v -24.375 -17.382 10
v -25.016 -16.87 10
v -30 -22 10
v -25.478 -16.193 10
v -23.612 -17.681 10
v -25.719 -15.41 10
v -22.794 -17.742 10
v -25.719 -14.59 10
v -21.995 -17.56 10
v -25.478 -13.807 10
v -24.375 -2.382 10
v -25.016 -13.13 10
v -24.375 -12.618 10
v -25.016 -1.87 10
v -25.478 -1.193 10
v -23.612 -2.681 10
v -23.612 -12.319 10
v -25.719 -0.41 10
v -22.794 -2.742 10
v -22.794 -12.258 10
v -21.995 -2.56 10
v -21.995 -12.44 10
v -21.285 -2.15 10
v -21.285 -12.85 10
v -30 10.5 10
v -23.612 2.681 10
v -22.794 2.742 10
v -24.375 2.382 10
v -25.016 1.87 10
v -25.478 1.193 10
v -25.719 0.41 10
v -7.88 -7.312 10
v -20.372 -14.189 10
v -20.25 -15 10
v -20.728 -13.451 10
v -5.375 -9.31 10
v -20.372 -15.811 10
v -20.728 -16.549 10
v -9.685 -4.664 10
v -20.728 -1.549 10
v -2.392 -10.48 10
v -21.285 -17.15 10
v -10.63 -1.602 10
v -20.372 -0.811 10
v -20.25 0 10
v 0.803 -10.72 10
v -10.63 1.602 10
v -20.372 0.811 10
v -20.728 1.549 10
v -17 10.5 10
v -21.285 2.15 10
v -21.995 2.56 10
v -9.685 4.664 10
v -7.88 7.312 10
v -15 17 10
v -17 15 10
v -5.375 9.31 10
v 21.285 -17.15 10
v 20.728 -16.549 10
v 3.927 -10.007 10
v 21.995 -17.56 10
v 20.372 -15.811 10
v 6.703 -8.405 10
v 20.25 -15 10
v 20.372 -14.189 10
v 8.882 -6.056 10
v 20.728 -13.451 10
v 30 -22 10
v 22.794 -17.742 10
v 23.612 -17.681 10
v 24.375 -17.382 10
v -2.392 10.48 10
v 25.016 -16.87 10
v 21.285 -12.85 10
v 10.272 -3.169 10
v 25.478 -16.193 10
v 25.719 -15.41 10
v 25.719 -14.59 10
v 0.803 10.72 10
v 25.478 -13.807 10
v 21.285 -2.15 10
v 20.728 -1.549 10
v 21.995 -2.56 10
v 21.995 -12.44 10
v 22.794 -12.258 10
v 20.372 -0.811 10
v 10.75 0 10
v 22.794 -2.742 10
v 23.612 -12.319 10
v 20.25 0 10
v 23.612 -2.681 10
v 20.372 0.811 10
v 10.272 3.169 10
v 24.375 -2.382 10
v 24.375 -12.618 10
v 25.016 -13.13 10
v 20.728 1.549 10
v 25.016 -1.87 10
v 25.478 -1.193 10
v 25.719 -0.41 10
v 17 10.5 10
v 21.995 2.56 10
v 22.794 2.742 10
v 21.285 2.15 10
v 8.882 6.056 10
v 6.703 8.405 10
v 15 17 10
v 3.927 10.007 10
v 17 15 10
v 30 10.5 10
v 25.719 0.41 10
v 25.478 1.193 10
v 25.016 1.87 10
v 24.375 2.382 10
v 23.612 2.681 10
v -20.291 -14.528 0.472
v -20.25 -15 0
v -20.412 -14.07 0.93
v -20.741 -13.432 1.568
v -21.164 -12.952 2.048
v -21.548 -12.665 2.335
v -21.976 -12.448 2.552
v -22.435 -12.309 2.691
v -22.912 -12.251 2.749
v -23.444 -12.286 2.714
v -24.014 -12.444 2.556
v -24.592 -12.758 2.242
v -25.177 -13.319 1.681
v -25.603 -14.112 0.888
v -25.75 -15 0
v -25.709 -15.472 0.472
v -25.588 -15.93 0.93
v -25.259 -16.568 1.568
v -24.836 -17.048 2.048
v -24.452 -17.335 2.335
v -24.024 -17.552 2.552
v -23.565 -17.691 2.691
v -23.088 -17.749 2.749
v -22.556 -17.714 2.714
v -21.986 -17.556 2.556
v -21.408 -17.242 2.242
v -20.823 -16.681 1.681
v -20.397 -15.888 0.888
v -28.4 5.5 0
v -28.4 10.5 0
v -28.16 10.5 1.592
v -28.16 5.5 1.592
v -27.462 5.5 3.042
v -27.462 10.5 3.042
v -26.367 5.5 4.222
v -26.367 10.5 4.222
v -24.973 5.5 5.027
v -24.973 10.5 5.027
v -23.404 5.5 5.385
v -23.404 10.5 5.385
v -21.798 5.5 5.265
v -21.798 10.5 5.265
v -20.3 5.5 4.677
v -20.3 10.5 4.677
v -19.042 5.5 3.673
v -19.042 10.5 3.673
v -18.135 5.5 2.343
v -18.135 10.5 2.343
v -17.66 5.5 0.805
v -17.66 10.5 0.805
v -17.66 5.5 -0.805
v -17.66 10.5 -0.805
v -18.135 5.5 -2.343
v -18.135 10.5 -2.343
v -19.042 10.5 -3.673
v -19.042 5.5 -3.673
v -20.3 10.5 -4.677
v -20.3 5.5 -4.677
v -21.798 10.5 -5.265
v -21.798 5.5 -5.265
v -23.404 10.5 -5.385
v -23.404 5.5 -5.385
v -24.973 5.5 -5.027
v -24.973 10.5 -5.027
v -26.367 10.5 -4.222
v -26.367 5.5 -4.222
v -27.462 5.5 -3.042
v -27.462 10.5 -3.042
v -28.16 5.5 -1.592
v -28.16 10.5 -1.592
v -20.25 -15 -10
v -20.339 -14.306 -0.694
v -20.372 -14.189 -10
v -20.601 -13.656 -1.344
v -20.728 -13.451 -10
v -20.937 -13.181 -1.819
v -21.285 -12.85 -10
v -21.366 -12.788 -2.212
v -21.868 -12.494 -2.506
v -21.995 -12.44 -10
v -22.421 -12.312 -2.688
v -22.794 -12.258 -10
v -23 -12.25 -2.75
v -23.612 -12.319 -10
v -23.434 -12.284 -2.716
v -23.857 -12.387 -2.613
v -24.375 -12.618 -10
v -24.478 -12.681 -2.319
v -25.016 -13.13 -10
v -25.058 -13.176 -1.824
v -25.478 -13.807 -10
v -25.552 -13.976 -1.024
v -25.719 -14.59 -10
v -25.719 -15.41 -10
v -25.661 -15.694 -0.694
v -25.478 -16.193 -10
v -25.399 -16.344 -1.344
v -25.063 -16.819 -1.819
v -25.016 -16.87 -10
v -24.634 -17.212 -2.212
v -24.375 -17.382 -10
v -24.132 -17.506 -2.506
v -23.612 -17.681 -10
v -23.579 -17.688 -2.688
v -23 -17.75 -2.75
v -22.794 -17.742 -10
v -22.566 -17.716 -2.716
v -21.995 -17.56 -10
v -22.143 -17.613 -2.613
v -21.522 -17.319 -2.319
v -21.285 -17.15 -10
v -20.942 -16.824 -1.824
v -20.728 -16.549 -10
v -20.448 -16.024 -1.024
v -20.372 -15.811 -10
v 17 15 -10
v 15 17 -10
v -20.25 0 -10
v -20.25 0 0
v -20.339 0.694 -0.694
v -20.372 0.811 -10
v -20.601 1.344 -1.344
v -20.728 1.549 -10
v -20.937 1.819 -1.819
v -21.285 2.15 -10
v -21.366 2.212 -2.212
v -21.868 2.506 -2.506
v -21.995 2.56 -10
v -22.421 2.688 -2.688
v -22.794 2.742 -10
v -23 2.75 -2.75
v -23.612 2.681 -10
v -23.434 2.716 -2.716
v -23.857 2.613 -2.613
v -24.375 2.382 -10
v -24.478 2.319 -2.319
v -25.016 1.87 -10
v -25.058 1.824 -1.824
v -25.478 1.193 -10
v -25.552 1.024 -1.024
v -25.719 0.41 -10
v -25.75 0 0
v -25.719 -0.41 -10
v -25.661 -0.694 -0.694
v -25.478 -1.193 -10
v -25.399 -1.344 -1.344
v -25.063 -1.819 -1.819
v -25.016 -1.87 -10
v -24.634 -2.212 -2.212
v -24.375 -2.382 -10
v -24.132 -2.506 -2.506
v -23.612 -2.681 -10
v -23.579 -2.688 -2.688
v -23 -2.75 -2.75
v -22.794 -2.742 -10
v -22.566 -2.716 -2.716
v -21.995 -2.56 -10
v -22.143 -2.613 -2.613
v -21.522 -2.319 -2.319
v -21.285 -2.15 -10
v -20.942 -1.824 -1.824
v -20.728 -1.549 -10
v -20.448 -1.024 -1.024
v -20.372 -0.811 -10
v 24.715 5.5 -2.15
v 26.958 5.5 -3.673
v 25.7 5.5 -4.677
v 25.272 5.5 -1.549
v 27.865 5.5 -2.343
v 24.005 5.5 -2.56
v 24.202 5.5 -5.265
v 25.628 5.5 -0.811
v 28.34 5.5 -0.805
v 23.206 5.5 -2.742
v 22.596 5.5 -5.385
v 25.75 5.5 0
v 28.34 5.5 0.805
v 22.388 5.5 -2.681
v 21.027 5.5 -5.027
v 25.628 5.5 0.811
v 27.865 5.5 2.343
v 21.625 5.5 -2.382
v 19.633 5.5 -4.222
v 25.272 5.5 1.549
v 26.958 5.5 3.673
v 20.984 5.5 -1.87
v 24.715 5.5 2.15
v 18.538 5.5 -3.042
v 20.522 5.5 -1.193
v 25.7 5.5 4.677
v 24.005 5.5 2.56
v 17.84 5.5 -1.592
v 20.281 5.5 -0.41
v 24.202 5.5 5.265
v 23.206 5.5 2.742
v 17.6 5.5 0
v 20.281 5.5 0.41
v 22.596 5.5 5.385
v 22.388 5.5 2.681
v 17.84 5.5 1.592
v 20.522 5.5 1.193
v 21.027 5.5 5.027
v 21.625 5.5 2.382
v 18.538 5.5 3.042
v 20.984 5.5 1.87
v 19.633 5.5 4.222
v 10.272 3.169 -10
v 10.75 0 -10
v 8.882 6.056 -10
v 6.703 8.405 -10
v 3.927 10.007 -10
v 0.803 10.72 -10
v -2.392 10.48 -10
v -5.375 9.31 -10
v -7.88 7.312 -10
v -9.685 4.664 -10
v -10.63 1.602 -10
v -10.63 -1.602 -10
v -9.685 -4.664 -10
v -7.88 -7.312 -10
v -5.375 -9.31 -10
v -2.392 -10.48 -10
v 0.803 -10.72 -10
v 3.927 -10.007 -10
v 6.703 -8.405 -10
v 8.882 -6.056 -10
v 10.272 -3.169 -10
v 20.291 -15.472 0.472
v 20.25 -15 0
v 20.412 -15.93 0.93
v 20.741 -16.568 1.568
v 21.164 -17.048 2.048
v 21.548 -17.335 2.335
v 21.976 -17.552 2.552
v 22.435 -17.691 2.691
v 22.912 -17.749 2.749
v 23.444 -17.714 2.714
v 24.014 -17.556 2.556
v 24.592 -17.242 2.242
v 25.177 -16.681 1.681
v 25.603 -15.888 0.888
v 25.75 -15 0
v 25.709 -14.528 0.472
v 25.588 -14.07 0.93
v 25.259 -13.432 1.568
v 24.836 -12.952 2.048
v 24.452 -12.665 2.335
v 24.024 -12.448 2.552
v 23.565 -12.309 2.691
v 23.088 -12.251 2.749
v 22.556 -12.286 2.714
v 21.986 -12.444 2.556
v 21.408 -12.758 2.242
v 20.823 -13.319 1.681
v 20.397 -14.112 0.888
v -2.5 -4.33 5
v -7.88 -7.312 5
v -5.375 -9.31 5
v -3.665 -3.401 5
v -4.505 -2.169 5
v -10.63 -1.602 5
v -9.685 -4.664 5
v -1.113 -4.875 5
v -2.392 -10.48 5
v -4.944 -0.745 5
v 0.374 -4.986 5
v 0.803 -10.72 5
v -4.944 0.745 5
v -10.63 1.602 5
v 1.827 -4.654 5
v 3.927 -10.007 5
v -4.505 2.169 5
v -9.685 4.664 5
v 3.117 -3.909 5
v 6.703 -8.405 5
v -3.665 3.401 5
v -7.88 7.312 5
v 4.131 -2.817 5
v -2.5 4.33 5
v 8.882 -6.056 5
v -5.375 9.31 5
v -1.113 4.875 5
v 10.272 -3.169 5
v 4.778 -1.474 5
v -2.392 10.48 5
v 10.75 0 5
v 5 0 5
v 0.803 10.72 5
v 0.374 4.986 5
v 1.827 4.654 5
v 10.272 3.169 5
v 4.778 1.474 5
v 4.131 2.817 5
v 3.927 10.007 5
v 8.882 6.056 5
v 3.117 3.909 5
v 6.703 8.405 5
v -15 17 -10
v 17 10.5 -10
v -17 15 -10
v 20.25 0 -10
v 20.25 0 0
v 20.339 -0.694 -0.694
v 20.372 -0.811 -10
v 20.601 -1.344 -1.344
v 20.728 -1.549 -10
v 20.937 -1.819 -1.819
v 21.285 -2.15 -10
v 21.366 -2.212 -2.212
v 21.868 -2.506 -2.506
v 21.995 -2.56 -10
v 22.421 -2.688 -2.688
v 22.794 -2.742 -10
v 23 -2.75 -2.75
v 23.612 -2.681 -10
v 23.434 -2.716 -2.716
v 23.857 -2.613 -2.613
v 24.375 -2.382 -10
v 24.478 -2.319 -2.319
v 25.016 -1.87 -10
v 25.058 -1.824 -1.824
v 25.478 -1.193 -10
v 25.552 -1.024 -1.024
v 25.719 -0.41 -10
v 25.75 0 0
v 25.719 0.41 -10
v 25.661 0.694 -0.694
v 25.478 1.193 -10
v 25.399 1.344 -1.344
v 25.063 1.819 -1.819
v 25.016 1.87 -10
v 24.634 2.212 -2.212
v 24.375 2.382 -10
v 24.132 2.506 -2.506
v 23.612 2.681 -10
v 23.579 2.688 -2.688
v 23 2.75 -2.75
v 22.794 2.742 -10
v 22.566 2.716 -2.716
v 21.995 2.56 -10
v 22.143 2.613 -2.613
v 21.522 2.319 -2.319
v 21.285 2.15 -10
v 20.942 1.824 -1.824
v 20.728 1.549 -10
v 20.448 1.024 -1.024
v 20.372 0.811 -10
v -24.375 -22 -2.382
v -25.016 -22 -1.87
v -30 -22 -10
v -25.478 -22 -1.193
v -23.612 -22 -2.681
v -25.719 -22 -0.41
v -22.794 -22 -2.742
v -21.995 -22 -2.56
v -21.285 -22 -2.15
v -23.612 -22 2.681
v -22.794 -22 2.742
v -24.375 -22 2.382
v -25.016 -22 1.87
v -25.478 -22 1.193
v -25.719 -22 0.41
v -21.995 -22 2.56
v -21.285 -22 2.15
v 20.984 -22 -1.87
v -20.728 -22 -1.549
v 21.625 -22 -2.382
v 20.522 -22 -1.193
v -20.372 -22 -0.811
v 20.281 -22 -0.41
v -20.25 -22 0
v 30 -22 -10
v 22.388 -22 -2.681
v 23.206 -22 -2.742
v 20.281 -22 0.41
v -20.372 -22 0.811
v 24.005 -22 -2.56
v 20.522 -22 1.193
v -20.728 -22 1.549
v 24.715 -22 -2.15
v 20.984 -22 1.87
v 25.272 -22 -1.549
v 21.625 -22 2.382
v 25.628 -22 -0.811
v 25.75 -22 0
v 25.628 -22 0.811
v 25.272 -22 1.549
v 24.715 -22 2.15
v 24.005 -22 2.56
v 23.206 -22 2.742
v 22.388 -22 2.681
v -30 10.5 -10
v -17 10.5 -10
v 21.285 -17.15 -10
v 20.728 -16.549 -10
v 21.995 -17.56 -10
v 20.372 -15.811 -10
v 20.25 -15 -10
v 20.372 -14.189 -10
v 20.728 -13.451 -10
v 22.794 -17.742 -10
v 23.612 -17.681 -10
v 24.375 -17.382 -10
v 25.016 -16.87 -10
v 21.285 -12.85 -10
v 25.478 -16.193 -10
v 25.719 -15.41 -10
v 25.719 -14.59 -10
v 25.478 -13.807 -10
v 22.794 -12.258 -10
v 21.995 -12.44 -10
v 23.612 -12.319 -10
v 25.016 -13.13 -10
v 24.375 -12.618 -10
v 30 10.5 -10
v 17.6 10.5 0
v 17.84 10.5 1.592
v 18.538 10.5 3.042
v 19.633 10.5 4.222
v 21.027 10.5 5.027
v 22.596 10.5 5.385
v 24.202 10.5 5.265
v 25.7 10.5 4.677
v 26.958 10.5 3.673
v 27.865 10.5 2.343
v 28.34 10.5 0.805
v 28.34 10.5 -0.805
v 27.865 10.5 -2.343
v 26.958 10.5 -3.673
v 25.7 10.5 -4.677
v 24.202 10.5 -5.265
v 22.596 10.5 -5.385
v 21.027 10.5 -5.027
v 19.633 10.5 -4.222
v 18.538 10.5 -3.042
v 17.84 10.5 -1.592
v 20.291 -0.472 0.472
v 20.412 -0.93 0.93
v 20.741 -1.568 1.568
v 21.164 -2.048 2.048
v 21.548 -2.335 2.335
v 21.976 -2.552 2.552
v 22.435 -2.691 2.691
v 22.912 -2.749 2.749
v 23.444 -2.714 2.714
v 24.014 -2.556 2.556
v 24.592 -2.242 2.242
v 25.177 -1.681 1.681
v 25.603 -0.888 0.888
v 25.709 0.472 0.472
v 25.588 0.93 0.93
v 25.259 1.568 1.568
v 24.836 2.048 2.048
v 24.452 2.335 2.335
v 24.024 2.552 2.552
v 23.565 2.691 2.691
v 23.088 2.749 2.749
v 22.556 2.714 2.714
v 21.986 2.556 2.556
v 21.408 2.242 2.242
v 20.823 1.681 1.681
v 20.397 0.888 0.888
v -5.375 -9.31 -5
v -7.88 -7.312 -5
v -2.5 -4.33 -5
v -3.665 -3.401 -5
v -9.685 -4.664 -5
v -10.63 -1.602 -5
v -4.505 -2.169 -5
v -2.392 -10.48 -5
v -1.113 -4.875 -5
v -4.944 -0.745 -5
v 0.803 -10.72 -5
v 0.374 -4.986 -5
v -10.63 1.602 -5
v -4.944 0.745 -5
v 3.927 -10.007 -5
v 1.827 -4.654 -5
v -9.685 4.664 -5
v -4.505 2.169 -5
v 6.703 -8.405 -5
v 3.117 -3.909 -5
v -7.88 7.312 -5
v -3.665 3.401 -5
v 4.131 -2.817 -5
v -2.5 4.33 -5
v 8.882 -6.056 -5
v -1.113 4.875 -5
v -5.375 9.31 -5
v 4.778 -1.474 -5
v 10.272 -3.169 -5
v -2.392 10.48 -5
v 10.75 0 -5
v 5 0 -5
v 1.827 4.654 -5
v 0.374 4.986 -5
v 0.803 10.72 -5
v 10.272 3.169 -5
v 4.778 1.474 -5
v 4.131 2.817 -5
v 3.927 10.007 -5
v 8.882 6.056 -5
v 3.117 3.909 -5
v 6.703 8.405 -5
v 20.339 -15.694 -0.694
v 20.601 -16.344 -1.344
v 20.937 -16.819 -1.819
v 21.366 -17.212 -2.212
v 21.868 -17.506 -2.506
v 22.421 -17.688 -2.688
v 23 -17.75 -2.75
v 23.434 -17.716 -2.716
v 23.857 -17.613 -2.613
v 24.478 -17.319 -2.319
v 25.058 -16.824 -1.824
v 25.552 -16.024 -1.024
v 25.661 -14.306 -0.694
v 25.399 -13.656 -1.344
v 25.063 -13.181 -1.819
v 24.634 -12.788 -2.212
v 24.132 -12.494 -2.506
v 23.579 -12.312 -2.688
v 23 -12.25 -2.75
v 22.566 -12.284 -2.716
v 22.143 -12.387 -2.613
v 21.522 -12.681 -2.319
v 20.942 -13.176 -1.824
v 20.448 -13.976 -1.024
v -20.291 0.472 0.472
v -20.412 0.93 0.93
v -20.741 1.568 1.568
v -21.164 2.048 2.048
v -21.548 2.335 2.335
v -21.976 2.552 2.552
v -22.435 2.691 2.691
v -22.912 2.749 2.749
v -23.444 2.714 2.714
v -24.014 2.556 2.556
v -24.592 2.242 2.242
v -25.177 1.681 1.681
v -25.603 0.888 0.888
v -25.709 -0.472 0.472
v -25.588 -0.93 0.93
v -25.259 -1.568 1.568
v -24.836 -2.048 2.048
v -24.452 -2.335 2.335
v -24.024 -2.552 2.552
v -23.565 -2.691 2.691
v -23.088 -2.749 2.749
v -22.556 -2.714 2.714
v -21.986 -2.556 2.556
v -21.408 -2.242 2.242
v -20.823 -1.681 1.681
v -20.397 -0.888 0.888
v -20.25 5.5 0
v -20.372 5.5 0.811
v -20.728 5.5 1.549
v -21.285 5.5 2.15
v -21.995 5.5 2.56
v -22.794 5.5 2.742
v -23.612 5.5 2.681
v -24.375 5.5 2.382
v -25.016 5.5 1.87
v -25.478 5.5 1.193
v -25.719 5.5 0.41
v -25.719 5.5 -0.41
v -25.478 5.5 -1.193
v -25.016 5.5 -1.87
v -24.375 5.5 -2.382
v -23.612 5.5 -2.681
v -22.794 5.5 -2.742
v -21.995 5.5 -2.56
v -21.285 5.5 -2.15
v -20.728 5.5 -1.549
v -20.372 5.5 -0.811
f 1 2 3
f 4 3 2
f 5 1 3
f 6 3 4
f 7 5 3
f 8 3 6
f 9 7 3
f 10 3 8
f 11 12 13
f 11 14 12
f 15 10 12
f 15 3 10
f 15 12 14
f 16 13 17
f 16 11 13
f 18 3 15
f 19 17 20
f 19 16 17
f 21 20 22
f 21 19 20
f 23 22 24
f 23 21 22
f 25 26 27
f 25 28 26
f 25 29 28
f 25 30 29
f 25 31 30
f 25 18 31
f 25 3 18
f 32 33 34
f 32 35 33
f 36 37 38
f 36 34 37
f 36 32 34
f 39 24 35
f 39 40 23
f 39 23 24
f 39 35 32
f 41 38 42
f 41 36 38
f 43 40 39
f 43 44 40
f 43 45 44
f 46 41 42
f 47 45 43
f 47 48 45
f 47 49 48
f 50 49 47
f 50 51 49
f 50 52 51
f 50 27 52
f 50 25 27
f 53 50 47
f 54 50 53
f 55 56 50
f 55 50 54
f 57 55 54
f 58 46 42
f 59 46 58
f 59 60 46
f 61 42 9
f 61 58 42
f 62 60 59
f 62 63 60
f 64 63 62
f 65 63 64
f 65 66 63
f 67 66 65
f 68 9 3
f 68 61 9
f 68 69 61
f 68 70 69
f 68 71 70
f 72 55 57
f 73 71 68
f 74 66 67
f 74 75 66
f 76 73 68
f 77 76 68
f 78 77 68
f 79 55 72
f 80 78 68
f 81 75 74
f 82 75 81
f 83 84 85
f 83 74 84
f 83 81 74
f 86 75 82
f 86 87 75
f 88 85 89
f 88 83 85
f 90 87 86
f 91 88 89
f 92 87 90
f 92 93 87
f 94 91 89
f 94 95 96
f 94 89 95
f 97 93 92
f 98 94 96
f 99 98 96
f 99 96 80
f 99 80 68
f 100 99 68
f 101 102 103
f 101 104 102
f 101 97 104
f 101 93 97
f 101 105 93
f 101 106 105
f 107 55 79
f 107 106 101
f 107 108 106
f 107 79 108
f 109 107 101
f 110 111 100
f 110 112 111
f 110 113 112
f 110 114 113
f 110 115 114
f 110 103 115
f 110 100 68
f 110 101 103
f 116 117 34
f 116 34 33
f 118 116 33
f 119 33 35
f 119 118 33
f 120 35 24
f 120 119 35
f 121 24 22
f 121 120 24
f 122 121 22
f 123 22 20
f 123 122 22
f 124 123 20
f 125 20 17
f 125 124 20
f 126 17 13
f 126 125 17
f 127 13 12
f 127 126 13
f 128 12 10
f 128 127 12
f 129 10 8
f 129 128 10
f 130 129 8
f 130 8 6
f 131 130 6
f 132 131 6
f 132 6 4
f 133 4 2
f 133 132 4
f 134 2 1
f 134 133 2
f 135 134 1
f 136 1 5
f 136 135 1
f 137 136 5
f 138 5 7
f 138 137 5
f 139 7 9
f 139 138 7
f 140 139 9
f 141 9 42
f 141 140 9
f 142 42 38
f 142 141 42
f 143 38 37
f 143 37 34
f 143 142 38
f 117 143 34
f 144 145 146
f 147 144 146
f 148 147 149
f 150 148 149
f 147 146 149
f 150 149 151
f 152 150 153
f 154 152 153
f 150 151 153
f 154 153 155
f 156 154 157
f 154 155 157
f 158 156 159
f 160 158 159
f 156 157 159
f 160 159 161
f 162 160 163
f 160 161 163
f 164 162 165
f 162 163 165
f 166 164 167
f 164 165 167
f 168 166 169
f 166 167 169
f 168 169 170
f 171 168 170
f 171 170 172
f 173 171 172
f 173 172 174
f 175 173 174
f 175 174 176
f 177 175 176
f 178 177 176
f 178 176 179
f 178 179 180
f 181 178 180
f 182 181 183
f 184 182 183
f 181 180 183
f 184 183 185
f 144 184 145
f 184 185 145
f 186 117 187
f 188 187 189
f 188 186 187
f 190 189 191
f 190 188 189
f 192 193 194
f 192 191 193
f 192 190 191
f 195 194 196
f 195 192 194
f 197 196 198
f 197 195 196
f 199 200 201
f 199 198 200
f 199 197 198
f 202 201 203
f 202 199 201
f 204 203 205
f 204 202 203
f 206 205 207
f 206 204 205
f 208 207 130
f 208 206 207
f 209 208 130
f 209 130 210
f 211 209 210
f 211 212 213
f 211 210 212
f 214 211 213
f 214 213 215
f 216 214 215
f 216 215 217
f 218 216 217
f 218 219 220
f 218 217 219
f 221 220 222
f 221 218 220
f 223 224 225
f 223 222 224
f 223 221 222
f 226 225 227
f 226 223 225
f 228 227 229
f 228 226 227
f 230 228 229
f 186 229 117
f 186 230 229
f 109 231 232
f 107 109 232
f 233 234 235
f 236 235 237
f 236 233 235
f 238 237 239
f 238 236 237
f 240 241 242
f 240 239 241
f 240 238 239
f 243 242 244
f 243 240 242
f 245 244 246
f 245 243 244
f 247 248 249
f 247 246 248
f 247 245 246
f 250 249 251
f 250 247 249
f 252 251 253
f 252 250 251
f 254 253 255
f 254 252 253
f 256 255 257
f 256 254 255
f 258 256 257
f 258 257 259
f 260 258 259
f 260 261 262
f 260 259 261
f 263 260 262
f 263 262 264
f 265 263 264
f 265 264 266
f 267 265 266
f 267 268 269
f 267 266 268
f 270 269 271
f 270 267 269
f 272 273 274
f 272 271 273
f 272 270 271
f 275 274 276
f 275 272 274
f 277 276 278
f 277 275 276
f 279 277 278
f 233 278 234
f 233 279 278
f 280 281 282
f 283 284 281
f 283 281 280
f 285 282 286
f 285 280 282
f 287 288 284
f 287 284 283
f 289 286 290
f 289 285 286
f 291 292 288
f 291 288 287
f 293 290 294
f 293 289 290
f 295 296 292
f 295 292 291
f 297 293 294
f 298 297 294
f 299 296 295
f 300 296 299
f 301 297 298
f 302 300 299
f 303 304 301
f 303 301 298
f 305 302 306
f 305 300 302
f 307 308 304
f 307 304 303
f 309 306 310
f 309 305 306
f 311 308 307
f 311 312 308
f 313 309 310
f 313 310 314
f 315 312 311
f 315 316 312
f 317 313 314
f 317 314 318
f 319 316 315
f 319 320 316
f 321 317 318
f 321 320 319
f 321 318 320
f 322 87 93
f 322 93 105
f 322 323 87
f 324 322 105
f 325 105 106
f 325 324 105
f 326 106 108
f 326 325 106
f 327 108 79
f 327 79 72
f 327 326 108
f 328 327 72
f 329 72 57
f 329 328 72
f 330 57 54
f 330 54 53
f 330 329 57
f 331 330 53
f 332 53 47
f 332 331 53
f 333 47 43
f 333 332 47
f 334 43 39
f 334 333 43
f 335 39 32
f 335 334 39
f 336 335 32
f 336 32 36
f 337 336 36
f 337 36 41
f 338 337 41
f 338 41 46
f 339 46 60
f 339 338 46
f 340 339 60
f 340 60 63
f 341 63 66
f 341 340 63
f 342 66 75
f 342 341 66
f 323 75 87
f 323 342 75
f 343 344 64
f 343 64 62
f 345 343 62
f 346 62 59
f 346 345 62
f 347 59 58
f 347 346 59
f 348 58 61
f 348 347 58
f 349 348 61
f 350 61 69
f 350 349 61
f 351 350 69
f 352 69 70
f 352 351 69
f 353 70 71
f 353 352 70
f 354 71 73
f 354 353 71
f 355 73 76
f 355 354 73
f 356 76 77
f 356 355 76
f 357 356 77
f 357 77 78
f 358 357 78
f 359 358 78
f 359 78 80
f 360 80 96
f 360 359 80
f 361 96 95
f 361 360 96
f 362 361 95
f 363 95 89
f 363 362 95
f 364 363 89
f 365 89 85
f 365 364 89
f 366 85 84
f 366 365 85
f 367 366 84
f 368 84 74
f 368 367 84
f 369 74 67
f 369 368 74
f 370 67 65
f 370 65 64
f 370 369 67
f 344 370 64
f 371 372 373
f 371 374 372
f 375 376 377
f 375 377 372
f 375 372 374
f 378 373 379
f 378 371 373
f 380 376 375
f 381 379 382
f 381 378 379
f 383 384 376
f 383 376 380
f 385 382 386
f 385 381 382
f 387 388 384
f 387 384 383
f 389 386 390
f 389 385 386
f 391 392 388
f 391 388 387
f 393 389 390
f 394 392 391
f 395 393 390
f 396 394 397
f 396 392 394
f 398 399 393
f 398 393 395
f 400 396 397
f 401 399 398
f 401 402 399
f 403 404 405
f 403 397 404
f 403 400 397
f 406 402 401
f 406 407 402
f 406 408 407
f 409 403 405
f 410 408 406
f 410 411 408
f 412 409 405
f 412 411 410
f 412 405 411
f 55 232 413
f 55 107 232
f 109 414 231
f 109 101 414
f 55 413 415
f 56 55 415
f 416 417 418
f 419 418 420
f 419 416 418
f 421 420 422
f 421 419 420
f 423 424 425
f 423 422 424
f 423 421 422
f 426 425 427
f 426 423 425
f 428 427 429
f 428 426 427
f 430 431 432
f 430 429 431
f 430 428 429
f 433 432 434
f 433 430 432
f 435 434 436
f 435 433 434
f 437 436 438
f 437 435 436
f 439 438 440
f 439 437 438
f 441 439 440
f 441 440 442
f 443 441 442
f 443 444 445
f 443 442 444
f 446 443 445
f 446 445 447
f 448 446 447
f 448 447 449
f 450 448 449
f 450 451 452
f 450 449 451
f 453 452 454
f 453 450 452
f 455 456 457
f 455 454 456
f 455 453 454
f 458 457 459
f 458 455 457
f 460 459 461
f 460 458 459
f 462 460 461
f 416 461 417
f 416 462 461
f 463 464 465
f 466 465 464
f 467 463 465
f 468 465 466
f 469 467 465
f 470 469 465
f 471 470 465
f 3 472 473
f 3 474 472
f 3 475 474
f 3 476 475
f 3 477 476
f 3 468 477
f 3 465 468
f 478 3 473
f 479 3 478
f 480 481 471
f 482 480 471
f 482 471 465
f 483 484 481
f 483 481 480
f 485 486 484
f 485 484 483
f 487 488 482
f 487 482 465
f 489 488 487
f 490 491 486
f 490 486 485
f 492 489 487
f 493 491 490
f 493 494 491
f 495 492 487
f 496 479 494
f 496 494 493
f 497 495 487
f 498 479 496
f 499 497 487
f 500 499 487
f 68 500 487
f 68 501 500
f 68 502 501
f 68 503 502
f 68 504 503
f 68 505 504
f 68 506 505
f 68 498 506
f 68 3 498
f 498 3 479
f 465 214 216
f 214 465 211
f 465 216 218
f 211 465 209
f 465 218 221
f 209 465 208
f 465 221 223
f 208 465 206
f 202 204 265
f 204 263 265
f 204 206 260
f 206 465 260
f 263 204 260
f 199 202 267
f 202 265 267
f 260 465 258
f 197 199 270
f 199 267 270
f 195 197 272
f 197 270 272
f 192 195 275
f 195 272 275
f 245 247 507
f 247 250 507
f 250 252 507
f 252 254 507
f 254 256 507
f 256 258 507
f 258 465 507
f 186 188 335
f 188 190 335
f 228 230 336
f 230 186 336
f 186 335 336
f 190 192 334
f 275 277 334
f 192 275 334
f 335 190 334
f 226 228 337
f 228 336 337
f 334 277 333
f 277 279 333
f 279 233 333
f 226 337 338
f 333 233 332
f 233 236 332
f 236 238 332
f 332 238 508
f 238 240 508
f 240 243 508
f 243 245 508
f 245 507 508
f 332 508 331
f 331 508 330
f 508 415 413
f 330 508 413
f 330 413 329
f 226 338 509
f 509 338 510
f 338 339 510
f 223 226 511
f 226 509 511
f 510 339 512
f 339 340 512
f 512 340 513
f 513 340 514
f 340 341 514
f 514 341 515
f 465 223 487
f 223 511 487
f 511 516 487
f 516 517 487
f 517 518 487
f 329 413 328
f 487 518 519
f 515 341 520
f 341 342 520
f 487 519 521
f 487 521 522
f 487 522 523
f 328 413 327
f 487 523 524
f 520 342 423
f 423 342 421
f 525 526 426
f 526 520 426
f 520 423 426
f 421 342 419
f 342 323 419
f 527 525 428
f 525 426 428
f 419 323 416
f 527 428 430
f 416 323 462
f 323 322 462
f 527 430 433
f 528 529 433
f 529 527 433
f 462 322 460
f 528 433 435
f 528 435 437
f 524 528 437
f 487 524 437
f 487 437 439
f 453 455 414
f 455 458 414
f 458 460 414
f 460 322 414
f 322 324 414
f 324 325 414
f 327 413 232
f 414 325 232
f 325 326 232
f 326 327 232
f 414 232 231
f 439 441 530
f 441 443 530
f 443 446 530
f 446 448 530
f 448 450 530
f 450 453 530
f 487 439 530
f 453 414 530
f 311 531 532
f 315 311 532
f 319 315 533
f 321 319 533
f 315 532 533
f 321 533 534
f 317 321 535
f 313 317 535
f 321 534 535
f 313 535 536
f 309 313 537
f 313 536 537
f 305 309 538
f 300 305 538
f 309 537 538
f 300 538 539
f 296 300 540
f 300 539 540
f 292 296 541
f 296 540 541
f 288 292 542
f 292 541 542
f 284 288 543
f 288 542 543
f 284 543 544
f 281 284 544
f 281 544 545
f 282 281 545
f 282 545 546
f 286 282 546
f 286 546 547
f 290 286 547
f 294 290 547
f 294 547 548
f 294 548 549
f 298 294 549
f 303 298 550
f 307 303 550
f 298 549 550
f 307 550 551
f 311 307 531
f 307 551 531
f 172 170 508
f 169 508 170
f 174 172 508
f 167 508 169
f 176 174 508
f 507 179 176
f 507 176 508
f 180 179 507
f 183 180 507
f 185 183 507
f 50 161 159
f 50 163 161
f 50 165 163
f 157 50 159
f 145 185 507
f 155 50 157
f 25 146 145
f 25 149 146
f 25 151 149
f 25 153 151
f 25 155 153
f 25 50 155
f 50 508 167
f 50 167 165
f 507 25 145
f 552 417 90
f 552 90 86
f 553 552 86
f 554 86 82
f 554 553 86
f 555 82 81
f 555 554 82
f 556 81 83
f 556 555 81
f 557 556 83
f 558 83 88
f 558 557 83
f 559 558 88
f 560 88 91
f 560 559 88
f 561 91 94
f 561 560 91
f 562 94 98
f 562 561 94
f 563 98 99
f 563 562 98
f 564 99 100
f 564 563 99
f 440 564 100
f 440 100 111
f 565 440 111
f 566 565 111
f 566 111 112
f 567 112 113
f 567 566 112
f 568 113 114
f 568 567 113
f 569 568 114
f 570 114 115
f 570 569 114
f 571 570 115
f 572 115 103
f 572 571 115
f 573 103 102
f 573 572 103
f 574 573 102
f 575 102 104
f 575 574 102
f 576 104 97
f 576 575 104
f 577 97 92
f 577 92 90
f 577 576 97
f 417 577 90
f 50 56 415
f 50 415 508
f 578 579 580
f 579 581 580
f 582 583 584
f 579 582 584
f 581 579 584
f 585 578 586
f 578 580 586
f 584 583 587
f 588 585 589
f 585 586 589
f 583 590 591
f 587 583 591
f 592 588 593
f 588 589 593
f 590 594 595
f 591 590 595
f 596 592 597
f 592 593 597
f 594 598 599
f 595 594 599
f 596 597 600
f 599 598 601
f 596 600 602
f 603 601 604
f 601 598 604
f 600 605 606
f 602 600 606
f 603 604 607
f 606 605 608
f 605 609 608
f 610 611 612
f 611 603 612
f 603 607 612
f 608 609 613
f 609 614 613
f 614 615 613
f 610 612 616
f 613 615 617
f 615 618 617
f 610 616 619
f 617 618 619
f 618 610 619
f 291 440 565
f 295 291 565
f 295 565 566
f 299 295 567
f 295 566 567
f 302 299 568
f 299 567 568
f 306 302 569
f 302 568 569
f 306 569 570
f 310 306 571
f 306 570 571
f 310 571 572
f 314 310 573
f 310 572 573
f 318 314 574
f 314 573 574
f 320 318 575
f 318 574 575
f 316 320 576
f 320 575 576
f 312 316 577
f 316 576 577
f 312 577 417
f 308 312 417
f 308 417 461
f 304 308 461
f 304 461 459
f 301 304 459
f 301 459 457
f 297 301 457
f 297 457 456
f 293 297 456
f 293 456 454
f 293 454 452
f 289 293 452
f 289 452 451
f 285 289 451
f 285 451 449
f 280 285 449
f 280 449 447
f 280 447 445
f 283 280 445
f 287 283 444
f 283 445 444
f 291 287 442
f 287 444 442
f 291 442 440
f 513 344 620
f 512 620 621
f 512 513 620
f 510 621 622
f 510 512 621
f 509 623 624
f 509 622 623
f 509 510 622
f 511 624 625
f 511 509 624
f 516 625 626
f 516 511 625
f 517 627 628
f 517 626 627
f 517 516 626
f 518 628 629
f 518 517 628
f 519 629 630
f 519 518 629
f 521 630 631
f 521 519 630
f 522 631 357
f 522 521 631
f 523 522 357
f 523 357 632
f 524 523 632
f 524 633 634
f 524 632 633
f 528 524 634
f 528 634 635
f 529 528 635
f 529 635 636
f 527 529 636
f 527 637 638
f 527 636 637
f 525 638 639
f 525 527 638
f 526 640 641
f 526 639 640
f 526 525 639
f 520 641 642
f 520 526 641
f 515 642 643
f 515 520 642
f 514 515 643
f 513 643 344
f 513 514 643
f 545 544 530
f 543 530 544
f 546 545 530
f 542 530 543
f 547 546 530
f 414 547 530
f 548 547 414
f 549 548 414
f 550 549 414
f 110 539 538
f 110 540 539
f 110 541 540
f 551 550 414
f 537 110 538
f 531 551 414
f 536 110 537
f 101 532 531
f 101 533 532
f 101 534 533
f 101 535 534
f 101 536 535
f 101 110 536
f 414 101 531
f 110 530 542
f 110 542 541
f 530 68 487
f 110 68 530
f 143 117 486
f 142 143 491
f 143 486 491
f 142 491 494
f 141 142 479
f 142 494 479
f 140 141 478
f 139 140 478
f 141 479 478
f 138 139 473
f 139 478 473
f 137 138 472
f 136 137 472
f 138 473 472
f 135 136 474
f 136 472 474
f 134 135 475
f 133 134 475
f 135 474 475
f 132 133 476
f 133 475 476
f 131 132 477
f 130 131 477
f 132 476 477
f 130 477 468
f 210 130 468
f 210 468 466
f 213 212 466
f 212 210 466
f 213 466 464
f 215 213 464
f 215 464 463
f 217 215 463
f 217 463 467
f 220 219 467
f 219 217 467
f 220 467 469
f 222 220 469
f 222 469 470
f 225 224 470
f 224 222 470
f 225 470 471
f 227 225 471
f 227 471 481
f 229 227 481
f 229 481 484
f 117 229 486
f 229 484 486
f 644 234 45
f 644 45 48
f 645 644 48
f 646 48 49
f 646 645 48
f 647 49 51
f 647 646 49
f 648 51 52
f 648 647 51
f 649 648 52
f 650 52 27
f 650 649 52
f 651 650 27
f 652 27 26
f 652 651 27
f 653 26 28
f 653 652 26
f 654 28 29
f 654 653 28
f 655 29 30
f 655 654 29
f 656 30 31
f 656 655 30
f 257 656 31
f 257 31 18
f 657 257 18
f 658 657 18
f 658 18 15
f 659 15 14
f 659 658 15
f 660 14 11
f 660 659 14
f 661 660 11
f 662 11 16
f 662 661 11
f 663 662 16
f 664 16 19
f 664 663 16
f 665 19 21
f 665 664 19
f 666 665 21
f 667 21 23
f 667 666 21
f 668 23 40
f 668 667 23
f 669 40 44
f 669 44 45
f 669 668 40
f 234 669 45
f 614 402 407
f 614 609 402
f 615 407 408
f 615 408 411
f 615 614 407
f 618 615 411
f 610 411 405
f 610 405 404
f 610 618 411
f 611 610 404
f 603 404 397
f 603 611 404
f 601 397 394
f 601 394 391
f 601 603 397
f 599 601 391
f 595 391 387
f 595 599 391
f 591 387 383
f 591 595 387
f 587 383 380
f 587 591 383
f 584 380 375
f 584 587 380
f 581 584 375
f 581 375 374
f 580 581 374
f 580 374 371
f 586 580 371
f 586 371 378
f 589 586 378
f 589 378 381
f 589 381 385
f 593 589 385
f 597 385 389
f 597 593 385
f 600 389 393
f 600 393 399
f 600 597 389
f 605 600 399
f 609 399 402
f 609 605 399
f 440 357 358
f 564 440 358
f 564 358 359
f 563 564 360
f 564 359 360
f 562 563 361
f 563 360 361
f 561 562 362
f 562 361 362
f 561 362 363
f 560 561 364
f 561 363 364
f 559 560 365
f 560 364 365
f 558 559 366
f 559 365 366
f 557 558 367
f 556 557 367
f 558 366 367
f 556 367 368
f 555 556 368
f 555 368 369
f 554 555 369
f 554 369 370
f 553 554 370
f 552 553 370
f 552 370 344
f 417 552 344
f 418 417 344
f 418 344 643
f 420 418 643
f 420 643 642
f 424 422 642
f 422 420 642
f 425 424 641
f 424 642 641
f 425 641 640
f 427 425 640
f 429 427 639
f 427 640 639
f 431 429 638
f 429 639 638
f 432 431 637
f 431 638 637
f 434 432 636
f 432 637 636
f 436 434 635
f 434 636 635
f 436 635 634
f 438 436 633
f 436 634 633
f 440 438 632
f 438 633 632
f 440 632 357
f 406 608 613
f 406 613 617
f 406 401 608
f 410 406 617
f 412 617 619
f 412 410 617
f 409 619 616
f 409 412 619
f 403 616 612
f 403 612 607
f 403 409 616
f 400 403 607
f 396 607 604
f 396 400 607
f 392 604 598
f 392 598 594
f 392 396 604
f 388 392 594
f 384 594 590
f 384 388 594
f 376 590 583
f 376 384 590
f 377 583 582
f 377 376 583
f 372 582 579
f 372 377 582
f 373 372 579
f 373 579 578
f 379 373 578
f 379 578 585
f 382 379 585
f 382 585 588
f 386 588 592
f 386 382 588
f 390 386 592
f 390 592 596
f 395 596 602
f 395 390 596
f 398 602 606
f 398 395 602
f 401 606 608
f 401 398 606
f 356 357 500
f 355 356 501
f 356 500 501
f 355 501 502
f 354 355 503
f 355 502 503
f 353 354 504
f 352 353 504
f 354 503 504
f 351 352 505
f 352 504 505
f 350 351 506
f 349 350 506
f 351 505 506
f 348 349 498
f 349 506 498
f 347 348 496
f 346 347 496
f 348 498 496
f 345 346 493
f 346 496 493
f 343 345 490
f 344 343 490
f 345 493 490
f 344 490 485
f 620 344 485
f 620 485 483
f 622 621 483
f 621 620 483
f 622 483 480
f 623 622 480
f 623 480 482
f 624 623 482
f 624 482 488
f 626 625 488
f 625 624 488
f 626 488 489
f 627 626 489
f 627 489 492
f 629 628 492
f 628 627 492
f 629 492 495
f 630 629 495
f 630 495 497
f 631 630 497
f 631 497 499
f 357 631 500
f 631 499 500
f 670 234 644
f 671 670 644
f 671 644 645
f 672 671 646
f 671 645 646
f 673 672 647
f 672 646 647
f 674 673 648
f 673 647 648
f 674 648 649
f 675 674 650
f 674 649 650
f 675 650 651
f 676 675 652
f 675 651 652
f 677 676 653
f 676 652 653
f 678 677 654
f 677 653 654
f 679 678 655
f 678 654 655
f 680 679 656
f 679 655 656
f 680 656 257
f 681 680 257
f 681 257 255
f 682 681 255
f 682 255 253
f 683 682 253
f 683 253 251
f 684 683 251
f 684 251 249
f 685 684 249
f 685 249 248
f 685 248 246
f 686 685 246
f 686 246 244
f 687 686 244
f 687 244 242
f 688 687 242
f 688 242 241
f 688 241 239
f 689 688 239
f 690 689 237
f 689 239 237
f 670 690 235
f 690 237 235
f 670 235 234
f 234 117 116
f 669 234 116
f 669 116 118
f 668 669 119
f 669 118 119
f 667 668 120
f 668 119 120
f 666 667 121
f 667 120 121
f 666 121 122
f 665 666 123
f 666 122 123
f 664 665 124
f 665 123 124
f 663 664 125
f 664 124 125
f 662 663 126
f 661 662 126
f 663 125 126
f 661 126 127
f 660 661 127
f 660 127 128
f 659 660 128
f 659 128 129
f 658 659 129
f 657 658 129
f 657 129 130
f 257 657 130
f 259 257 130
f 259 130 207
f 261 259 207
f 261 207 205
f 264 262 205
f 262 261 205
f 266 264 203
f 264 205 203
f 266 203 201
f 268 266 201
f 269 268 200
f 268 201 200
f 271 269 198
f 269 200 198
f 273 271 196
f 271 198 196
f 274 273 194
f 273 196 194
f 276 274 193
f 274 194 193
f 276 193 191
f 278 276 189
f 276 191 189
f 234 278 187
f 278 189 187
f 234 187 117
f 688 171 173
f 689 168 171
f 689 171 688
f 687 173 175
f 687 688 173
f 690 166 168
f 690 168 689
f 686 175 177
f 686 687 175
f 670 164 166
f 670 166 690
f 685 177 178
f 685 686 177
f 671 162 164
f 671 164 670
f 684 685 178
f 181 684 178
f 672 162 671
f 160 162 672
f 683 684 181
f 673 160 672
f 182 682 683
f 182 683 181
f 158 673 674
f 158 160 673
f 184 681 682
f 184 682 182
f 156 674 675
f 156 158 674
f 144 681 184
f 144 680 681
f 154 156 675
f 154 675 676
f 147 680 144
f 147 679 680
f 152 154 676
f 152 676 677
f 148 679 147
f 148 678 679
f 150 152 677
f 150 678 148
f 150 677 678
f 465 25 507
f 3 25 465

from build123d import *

# Parameters (mm, degrees)
SKETCH2_R           = 10.75
SKETCH2_R_2         = 2.75
BOSS_EXTRUDE2_DEPTH = 10
SKETCH3_R           = 2.75
CUT_EXTRUDE1_DEPTH  = 51.209560843
SKETCH4_R           = 5.4
CUT_EXTRUDE2_DEPTH  = 5
SKETCH5_R           = 10.75
SKETCH5_R_2         = 5
BOSS_EXTRUDE4_DEPTH = 5


with BuildPart() as part:
    # Sketch2 → Boss-Extrude2 (new, symmetric)
    with BuildSketch(Plane.XY):
        Polygon((15, 17), (-15, 17), (-17, 15), (-17, 10.5), (-30, 10.5), (-30, -22), (30, -22), (30, 10.5), (17, 10.5), (17, 15), align=None)
        Circle(SKETCH2_R, mode=Mode.SUBTRACT)
        with Locations((-23, 0)):
            Circle(SKETCH2_R_2, mode=Mode.SUBTRACT)
        with Locations((-23, -15)):
            Circle(SKETCH2_R_2, mode=Mode.SUBTRACT)
        with Locations(Location((23, -15, 0), (0, 0, 180))):
            Circle(SKETCH2_R_2, mode=Mode.SUBTRACT)
        with Locations(Location((23, 0, 0), (0, 0, 180))):
            Circle(SKETCH2_R_2, mode=Mode.SUBTRACT)
    extrude(amount=BOSS_EXTRUDE2_DEPTH, both=True)

    # Sketch3 → Cut-Extrude1 (cut, through all)
    with BuildSketch(Plane.XZ.offset(22)):
        with Locations((23, 0)):
            Circle(SKETCH3_R)
        with Locations((-23, 0)):
            Circle(SKETCH3_R)
    extrude(amount=-CUT_EXTRUDE1_DEPTH, mode=Mode.SUBTRACT)

    # Sketch4 → Cut-Extrude2 (cut)
    with BuildSketch(Plane(origin=(0, 10.5, 0), x_dir=(1, 0, 0), z_dir=(0, 1, 0))):
        with Locations(Location((-23, 0, 0), (0, 0, 180))):
            Circle(SKETCH4_R)
        with Locations(Location((23, 0, 0), (0, 0, 180))):
            Circle(SKETCH4_R)
    extrude(amount=-CUT_EXTRUDE2_DEPTH, mode=Mode.SUBTRACT)


with BuildPart() as body_2:
    # Sketch5 → Boss-Extrude4 (new, symmetric)
    with BuildSketch(Plane.XY):
        Circle(SKETCH5_R)
        Circle(SKETCH5_R_2, mode=Mode.SUBTRACT)
    extrude(amount=BOSS_EXTRUDE4_DEPTH, both=True)


solid = Compound([part.part, body_2.part])
